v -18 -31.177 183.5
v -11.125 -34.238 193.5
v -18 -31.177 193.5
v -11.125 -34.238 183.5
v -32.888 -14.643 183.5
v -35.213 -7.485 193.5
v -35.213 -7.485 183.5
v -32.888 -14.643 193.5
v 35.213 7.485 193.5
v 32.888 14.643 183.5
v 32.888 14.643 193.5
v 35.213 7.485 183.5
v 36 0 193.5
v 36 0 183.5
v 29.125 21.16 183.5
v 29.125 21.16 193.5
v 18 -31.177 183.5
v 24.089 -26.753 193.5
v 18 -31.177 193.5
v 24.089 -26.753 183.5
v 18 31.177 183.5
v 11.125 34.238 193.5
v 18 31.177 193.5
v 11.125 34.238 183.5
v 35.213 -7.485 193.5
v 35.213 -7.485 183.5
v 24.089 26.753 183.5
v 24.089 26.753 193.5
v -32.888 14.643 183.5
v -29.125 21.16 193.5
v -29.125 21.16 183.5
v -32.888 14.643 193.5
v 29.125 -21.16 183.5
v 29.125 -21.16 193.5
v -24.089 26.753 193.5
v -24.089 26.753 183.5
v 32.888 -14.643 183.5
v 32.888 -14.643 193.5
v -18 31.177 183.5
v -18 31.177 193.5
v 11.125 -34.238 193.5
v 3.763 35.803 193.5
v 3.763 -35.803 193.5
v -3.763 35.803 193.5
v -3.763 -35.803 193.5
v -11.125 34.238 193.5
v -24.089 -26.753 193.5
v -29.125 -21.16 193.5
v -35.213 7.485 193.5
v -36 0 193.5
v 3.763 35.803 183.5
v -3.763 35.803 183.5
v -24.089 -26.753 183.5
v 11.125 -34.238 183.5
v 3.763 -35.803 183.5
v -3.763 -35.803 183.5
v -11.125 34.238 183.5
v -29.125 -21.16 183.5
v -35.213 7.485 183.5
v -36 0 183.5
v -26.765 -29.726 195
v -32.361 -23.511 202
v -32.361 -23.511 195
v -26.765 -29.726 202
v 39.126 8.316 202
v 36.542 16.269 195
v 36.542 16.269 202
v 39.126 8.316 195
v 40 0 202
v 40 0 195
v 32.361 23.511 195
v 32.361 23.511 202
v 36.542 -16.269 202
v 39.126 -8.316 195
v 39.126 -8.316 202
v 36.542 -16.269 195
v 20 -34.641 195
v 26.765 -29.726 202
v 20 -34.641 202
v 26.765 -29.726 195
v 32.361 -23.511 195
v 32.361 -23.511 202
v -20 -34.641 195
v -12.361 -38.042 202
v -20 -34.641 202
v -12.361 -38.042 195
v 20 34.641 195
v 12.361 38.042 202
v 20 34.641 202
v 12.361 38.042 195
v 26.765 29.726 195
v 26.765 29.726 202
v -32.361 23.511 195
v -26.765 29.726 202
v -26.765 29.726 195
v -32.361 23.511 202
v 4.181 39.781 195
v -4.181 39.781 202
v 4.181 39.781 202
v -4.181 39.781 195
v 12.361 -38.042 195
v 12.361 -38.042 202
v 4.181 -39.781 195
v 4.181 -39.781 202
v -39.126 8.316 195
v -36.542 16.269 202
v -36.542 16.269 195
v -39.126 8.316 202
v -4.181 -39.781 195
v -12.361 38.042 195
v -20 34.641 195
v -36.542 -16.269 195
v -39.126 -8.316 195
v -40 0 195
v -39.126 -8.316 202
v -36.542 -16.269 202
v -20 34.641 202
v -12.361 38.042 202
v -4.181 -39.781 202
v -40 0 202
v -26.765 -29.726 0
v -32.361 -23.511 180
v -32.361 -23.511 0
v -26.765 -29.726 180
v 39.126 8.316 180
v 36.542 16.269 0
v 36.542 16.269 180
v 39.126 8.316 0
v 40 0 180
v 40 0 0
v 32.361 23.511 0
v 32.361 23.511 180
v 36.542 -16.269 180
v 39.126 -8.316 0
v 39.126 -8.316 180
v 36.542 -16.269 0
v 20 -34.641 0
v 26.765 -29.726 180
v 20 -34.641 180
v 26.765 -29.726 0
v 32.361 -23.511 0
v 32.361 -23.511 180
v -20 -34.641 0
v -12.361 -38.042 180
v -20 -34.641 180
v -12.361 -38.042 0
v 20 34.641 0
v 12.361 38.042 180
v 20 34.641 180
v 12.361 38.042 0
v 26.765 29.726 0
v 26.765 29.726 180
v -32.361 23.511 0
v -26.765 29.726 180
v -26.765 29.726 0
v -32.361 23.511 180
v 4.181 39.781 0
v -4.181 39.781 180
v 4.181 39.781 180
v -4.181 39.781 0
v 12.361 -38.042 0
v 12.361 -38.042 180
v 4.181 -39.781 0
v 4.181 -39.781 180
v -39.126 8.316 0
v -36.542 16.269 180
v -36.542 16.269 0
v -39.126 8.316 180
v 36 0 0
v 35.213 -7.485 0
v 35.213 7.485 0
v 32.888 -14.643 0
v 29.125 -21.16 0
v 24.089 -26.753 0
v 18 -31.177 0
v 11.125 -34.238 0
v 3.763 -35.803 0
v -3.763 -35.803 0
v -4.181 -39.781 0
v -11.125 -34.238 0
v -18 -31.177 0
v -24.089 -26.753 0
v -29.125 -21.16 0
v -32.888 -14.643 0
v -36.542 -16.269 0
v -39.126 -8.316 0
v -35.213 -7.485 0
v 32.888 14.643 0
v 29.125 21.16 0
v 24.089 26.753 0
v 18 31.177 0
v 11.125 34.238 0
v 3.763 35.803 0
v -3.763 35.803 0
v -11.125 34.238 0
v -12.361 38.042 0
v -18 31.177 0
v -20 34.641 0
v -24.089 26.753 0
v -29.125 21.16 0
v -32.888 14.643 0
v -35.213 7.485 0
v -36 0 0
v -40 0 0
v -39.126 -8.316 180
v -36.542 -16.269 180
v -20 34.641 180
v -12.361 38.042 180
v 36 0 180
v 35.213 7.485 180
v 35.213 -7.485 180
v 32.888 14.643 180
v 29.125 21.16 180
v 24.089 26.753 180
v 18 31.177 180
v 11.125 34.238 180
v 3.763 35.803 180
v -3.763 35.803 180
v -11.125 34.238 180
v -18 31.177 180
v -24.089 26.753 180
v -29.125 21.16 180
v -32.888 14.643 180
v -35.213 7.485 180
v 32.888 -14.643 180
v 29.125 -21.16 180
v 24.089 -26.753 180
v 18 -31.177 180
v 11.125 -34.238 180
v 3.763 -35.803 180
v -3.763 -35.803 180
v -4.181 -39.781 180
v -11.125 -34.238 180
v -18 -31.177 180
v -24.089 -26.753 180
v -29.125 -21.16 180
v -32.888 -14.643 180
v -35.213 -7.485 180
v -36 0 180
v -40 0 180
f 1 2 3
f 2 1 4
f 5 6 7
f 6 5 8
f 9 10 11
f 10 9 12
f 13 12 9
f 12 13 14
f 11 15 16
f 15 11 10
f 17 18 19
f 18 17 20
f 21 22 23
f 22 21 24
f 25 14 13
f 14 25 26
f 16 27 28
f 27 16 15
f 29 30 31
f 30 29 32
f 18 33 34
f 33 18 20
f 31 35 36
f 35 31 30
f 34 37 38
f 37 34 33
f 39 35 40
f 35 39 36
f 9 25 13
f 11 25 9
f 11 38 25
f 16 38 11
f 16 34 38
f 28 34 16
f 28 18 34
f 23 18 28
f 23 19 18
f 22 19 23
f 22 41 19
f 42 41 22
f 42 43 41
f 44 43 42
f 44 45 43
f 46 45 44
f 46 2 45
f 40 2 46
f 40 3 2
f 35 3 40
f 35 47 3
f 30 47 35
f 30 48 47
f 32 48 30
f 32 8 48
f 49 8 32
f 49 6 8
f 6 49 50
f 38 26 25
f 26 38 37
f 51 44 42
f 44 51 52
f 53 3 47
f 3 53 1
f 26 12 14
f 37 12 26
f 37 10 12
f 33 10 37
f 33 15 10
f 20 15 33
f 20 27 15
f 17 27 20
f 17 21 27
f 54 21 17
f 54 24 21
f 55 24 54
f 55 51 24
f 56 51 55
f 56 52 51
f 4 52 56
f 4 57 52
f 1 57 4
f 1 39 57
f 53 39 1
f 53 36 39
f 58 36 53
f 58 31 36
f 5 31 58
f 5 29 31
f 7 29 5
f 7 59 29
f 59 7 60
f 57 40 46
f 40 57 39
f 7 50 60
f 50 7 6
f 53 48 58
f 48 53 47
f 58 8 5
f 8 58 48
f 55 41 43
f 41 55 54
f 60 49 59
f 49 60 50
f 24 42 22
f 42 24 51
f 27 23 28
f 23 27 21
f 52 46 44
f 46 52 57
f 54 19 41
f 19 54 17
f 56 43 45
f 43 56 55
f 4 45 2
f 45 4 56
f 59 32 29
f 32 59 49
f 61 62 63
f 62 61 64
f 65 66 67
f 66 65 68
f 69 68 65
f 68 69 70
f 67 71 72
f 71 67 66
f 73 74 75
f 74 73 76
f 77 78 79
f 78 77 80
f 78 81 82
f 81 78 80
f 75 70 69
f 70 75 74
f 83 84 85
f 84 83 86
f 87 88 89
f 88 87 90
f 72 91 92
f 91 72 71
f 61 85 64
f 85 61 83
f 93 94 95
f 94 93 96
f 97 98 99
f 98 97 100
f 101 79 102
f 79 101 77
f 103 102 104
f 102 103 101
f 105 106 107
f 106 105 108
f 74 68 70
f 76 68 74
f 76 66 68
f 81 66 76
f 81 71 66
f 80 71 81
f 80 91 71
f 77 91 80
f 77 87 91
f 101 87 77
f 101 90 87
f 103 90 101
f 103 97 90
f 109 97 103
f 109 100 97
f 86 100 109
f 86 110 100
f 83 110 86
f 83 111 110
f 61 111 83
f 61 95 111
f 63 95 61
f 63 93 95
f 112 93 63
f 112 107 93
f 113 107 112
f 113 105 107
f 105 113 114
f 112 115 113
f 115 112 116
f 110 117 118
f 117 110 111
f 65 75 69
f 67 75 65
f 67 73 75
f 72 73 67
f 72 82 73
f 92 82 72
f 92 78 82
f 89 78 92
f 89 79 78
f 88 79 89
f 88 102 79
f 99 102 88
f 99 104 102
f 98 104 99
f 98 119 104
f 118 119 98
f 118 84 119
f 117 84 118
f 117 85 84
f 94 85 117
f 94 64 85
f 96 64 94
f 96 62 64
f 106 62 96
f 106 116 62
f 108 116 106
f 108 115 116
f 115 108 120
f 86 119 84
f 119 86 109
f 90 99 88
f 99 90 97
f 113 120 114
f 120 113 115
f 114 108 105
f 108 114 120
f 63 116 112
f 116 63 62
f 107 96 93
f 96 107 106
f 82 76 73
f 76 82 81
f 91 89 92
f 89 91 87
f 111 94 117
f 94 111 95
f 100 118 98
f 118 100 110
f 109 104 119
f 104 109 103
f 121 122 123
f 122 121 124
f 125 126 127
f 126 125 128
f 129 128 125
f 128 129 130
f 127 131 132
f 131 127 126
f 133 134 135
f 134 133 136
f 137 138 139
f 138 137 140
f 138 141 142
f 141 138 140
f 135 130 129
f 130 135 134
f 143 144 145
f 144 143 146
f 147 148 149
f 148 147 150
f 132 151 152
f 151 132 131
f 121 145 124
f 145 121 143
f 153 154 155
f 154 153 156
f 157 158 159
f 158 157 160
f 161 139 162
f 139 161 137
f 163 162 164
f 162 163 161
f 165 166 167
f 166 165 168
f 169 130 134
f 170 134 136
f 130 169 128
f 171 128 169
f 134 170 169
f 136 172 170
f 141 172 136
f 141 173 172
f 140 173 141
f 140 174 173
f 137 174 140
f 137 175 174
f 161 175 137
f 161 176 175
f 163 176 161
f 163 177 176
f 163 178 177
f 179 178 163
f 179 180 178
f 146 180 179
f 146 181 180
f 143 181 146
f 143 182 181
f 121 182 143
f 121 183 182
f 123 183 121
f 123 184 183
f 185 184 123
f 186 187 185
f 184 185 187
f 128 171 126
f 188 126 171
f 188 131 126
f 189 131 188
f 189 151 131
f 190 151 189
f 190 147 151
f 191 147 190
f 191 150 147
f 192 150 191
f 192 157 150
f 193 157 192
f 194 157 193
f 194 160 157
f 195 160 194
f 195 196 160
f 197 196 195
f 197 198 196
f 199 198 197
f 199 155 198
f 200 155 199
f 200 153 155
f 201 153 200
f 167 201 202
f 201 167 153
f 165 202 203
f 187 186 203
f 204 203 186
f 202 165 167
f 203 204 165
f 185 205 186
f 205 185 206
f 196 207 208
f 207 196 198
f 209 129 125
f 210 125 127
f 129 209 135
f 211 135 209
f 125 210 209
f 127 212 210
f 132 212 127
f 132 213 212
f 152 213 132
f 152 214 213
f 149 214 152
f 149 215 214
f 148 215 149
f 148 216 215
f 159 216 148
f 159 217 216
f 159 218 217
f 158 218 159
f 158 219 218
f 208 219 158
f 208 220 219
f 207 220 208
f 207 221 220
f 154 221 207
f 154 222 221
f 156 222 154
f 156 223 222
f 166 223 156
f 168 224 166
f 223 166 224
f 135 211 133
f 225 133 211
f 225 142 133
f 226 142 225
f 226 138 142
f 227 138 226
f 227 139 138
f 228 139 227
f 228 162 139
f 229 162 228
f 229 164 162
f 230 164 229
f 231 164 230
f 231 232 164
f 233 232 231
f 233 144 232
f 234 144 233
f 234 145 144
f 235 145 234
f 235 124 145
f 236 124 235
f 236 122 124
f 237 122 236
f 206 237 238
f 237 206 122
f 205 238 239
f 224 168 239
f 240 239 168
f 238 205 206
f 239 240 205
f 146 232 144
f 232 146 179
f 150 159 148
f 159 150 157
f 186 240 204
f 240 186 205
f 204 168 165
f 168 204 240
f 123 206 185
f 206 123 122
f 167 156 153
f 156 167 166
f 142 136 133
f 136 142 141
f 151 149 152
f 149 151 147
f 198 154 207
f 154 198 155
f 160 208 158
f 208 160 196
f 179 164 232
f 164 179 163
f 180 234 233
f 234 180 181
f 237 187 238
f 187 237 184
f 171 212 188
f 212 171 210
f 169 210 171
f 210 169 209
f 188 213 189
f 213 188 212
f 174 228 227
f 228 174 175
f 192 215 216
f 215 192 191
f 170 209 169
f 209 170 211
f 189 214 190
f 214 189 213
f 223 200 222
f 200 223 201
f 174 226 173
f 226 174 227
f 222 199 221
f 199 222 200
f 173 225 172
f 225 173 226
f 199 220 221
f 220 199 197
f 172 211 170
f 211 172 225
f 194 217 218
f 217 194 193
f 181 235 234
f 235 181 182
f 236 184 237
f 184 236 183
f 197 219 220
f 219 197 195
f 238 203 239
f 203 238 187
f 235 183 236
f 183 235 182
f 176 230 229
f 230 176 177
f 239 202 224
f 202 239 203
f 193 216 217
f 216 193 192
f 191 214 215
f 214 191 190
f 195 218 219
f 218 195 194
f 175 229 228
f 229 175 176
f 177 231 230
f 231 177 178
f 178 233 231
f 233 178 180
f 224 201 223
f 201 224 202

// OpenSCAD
// Lydener Bottle

HoLydBottle=180;
WalloLydBottle=4;
OutDoLydBottle=80;
InDoLydBottle=OutDoLydBottle-2*WalloLydBottle;


LydBottleCapTop=OutDoLydBottle;
HoLydBottleCapTop=7;
LydBottleCapIn=InDoLydBottle;
HoLydBottleCapIn=10;

translate([0,0,(HoLydBottleCapTop+HoLydBottleCapIn)/2+HoLydBottle]){
	Lydener_Bottle_Cap();
}
translate([0,0,HoLydBottle/2]){
	Lydener_Bottle();
}

module Lydener_Bottle(){
	difference(){
		cylinder(h=HoLydBottle,d1=OutDoLydBottle,d2=OutDoLydBottle,center=true);
		cylinder(h=HoLydBottle+0.01,d1=InDoLydBottle,d2=InDoLydBottle,center=true);
	}
}

module Lydener_Bottle_Cap(){
	cylinder(h=HoLydBottleCapIn,d1=LydBottleCapIn,d2=LydBottleCapIn,center=true);
	translate([0,0,HoLydBottleCapIn]){
		cylinder(h=HoLydBottleCapTop,d1=LydBottleCapTop,d2=LydBottleCapTop,center=true);
	}
}
